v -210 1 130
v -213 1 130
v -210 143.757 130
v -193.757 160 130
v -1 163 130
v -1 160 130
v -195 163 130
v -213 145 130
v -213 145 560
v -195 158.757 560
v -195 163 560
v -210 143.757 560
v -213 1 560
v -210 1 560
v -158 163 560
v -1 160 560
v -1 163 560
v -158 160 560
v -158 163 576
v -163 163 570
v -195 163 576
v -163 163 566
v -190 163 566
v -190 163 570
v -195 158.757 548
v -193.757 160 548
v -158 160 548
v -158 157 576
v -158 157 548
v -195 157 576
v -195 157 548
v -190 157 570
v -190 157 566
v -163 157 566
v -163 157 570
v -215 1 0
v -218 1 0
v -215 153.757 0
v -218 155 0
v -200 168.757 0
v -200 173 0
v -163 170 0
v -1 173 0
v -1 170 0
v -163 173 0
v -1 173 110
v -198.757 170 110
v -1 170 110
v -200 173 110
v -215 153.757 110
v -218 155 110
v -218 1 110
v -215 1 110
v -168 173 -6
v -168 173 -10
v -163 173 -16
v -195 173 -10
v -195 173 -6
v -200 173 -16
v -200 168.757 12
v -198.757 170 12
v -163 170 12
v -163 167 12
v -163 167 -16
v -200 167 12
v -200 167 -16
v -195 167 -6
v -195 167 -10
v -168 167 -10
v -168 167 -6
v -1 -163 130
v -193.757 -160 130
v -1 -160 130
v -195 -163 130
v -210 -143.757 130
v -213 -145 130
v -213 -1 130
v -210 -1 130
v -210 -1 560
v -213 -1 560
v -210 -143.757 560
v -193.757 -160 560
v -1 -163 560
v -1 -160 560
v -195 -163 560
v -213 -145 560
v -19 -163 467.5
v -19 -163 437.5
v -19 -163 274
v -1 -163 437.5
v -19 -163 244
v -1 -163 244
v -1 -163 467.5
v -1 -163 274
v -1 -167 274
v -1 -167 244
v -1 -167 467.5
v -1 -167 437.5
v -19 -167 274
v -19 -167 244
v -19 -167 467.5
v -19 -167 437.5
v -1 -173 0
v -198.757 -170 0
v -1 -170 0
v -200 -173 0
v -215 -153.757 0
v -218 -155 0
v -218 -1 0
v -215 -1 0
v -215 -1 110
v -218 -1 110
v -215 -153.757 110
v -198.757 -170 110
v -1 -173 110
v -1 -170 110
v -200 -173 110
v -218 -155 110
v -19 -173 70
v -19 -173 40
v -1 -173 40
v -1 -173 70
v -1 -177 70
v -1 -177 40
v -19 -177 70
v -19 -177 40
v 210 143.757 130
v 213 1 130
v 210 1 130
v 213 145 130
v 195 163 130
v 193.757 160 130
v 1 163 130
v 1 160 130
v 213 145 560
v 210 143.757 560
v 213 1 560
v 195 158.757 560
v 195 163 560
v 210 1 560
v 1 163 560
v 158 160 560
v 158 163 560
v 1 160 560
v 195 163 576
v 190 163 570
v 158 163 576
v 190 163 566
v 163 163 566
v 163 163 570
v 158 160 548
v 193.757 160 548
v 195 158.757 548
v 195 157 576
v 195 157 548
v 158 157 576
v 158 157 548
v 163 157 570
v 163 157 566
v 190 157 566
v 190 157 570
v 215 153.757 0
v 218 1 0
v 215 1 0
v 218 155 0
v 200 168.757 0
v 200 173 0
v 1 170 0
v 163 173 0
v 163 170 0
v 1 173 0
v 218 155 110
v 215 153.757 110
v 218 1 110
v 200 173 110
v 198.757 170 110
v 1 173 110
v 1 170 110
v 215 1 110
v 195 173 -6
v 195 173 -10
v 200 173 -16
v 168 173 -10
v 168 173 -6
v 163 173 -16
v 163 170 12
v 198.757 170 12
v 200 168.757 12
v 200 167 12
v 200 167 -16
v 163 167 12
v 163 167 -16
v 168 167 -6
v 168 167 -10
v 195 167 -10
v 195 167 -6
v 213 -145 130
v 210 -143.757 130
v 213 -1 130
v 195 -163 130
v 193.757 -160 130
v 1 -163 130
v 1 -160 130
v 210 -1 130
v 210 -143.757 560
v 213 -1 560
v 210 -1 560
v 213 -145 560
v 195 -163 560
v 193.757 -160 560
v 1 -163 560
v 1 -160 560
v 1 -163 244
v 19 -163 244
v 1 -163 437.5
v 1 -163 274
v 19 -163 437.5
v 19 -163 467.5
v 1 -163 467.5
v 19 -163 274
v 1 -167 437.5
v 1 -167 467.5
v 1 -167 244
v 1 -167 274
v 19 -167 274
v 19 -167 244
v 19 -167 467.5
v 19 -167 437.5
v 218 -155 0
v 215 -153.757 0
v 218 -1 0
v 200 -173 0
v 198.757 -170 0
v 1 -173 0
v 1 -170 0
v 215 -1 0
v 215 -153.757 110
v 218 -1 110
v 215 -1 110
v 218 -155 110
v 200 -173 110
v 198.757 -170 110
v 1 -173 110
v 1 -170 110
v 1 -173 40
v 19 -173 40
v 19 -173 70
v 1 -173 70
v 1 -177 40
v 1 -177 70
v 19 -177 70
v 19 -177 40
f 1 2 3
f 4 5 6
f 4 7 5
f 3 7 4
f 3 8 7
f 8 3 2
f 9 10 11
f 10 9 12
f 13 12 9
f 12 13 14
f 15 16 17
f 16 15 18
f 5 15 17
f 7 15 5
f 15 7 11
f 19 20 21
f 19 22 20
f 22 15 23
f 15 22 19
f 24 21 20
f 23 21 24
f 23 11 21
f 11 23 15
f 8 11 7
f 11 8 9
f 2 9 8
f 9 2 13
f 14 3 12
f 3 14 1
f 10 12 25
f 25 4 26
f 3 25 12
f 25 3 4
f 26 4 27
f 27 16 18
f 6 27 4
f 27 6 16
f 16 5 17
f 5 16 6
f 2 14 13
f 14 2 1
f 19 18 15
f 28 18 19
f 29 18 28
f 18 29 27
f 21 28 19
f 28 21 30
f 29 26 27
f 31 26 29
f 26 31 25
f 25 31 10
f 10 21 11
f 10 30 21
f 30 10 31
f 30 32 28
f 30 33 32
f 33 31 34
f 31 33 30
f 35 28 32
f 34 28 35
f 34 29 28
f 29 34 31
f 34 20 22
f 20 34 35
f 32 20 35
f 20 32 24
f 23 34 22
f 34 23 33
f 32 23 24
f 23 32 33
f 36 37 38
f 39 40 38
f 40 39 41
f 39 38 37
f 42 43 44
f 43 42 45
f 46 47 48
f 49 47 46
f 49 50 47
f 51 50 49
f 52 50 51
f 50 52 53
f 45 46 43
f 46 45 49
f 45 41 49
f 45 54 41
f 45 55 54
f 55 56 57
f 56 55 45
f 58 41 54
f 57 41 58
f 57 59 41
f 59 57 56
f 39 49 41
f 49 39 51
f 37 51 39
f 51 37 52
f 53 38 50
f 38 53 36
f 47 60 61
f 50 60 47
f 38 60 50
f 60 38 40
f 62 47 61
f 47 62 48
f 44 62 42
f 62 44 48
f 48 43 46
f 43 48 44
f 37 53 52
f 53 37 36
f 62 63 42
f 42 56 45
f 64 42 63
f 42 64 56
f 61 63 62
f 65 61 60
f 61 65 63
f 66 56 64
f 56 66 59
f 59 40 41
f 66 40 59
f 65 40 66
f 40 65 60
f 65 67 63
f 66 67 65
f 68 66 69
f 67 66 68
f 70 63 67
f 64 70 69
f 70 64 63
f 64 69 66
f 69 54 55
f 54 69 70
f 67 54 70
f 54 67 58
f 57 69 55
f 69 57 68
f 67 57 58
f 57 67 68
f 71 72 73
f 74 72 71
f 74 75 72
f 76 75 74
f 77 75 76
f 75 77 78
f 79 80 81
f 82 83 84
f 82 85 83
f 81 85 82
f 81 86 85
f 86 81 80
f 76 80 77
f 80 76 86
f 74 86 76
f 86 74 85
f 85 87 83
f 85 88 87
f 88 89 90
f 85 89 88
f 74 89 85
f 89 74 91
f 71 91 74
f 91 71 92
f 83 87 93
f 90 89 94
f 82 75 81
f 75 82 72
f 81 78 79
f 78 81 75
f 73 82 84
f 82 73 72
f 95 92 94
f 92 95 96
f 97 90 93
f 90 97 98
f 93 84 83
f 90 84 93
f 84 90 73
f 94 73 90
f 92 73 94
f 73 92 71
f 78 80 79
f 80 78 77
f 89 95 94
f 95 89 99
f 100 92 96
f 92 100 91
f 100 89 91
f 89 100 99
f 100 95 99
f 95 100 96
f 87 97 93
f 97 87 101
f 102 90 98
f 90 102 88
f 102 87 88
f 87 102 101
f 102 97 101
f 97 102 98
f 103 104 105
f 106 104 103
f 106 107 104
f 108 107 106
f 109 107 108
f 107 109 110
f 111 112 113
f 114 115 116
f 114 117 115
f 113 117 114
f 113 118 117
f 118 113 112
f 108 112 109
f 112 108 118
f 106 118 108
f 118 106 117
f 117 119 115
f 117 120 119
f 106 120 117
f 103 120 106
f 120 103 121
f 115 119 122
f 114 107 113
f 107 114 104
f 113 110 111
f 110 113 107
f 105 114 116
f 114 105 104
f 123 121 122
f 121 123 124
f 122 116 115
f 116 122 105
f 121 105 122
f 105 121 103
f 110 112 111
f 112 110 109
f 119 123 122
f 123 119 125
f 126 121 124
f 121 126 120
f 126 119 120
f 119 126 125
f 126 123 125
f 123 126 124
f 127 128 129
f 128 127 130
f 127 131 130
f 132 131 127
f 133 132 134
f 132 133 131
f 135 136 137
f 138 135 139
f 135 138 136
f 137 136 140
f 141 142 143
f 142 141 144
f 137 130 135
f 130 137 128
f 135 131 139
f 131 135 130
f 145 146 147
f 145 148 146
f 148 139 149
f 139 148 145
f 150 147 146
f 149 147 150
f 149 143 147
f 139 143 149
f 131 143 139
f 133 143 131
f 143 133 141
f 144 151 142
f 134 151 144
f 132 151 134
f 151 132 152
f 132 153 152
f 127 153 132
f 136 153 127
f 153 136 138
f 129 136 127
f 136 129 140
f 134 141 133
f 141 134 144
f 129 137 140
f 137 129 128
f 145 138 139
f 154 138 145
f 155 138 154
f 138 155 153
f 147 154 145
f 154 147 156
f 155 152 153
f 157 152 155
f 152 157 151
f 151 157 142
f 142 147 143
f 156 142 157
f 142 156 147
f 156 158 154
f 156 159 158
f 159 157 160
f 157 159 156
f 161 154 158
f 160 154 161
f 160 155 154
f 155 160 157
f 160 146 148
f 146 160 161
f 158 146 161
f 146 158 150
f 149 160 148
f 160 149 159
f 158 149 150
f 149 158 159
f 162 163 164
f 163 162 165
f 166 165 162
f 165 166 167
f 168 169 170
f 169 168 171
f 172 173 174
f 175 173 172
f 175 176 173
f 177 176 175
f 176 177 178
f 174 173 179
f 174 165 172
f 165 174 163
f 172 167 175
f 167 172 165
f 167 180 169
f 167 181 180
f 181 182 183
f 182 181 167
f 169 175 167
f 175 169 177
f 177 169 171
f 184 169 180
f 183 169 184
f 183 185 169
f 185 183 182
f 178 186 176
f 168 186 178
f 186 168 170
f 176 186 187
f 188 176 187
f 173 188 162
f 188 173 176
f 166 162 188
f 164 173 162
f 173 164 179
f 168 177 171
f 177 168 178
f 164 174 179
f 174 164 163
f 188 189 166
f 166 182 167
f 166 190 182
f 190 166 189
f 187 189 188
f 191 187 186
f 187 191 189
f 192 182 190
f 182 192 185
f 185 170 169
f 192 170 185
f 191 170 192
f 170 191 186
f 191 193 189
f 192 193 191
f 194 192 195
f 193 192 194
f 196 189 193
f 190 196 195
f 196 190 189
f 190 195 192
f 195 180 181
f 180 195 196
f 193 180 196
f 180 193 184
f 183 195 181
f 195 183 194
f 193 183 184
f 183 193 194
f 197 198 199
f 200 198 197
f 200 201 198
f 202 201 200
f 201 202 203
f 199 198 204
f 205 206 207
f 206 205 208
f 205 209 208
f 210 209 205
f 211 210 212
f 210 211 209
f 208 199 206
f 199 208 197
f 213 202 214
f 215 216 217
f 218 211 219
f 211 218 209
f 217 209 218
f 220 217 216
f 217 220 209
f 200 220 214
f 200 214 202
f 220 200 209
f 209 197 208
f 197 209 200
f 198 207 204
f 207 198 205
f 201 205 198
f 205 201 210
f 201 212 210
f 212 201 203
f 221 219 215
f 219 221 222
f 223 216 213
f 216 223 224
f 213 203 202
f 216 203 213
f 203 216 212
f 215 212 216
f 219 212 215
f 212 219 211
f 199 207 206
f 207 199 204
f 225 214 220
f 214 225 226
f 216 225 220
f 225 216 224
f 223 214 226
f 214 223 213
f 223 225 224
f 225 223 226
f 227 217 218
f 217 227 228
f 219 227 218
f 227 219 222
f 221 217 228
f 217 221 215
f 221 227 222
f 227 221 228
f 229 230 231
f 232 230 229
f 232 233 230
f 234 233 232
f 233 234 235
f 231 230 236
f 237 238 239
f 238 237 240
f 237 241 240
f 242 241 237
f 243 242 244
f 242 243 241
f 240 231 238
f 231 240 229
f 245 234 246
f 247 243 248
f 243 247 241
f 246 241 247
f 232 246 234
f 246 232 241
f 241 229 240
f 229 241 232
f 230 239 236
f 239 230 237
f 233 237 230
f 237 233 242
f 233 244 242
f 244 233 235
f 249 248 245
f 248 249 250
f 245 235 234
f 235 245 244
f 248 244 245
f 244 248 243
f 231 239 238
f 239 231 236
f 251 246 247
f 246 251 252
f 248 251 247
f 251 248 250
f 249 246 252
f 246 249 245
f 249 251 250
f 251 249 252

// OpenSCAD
// file: Parameters.scad
// SYNTHETIC DESIGN EXAMPLE ONLY. Generate project dimensions with suit_clamshell.py.
// limbs_mm rows: upperarm_l/r, forearm_l/r, thigh_l/r, shin_l/r; [diameter, length].
// boots_mm rows: l, r; [width, length]. torso_mm/helmet_mm: [width, depth, height]. hip_mm: [width, depth].
wall_mm = 3;
seam_gap_mm = 2;
hinge_offset_mm = 8;
opening_deg = 110;
elbow_gap_mm = 40;
elbow_relief_mm = 50;
knee_gap_mm = 40;
knee_relief_mm = 95;
ankle_gap_mm = 25;
boot_height_mm = 110;
belt_height_mm = 110;
belt_gap_mm = 20;
helmet_opening_deg = 100;
helmet_split_fraction = 0.12;
strap_width_mm = 25;
latch_pad_mm = [30, 18, 4];
latch_hole_d_mm = 0;
latch_holes_mm = [];
keeper_holes_mm = [];
limbs_mm = [[148, 270], [148, 270], [135, 230], [135, 230], [221, 380], [221, 380], [164, 365], [164, 365]];
boots_mm = [[140, 320], [140, 320]];
torso_mm = [426, 326, 430];
hip_mm = [436, 346];
shoulder_span_mm = 556;
entry_slide_mm = 50;
helmet_mm = [206, 246, 263];
// main file
// Torso module: two sliding rear wings, two front doors, belt band and the hang points
// for arm and leg modules. Concept envelopes only. No carrier, real hinge, slide rail,
// purchased latch or load approval; the fixed spine carrier is not modelled.
include <Parameters.scad>

side = "l";
open_fraction = 0;
piece = "assembly";
$fn = 48;

assert(side == "l" || side == "r", "side must be l or r");
assert(piece == "assembly" || piece == "rear" || piece == "door" || piece == "belt_rear" || piece == "belt_door",
       "piece must be assembly, rear, door, belt_rear or belt_door");
assert(is_num(open_fraction) && open_fraction >= 0 && open_fraction <= 1, "open_fraction must be 0..1");
assert(is_num(wall_mm) && wall_mm > 0, "positive wall required");
assert(is_num(seam_gap_mm) && seam_gap_mm > 0, "positive seam gap required");
assert(is_num(opening_deg) && opening_deg > 0 && opening_deg <= 150, "opening angle must be 0..150 degrees");
assert(len(torso_mm) == 3 && len(hip_mm) == 2, "torso needs [width, depth, height], hip [width, depth]");
assert(is_num(entry_slide_mm) && entry_slide_mm >= 0, "nonnegative entry slide required");
assert(is_num(belt_height_mm) && belt_height_mm > 0 && is_num(belt_gap_mm) && belt_gap_mm > 0, "invalid belt band");
assert(is_num(strap_width_mm) && strap_width_mm > 0, "positive strap width required");
assert(len(latch_pad_mm) == 3, "latch pad needs [length, width, thickness]");
assert(is_num(latch_hole_d_mm) && latch_hole_d_mm >= 0, "nonnegative latch hole diameter required");
// Hole lists: [across, along] per hole. across = distance from the seam centre line on the
// land, along = offset along the seam from the middle of the land. Empty lists leave it blank.
function holes_fit(holes) = len([for (h = holes) if (!(len(h) == 2 && latch_hole_d_mm > 0 &&
    h[0] - latch_hole_d_mm / 2 >= seam_gap_mm / 2 && h[0] + latch_hole_d_mm / 2 <= seam_gap_mm / 2 + latch_pad_mm[1] &&
    abs(h[1]) + latch_hole_d_mm / 2 <= latch_pad_mm[0] / 2)) 1]) == 0;
assert(is_list(latch_holes_mm) && holes_fit(latch_holes_mm), "latch holes need a diameter and must lie on the land");
assert(is_list(keeper_holes_mm) && holes_fit(keeper_holes_mm), "keeper holes need a diameter and must lie on the land");

chamfer = 18;
lug_margin = 6;
slot_height = 4;
lug_width = strap_width_mm + 2 * lug_margin;
lug_height = 2 * lug_margin + slot_height;
torso_z = belt_height_mm + belt_gap_mm;
assert(torso_mm[0] > 4 * chamfer && torso_mm[1] > 4 * chamfer && torso_mm[2] > 3 * latch_pad_mm[0], "torso too small");
assert(hip_mm[0] > 4 * chamfer && hip_mm[1] > 4 * chamfer, "hip too small");

// The motion follows the entry concept: wings slide apart first, then the doors swing out.
slide = entry_slide_mm * min(1, open_fraction * 4);
swing = opening_deg * max(0, (open_fraction - 0.25) / 0.75);

// Model axes: X to the wearer's right (side l is negative X), negative Y front, Z up.
module outline(w, d) {
    polygon([[-w / 2 + chamfer, -d / 2], [w / 2 - chamfer, -d / 2], [w / 2, -d / 2 + chamfer],
             [w / 2, d / 2 - chamfer], [w / 2 - chamfer, d / 2], [-w / 2 + chamfer, d / 2],
             [-w / 2, d / 2 - chamfer], [-w / 2, -d / 2 + chamfer]]);
}

module quadrant(w, d, h, sign, front) {
    intersection() {
        linear_extrude(height = h) difference() {
            outline(w, d);
            offset(delta = -wall_mm) outline(w, d);
        }
        translate([sign > 0 ? seam_gap_mm / 2 : -w, front ? -d : seam_gap_mm / 2, -1])
            cube([w - seam_gap_mm / 2, d - seam_gap_mm / 2, h + 2]);
    }
}

// Flat land for a purchased latch on the front of a door or belt half, next to the centre seam.
// The right half carries the latch body (latch_holes_mm), the left half the keeper.
module front_pad(d, sign, z) {
    x0 = sign > 0 ? seam_gap_mm / 2 : -seam_gap_mm / 2 - latch_pad_mm[1];
    difference() {
        translate([x0, -d / 2 - latch_pad_mm[2], z - latch_pad_mm[0] / 2])
            cube([latch_pad_mm[1], latch_pad_mm[2] + 1, latch_pad_mm[0]]);
        for (hole = sign > 0 ? latch_holes_mm : keeper_holes_mm)
                translate([sign * hole[0], -d / 2, z + hole[1]])
                    rotate([90, 0, 0]) cylinder(h = 2 * (latch_pad_mm[2] + wall_mm + 5), d = latch_hole_d_mm, center = true, $fn = 24);
    }
}

// Webbing tab; up = true stands above z, otherwise hangs below it.
module hang_lug(x, y, z, up) {
    translate([x - lug_width / 2, y - wall_mm - 3, up ? z - 12 : z - lug_height]) difference() {
        cube([lug_width, wall_mm + 3, 12 + lug_height]);
        translate([lug_margin - 1, -1, up ? 12 + lug_margin : lug_margin])
            cube([strap_width_mm + 2, wall_mm + 5, slot_height]);
    }
}

// Rear wing: carries the hang point of one arm module on top.
module rear_wing(sign) {
    color([0.19, 0.28, 0.20]) translate([0, 0, torso_z]) {
        quadrant(torso_mm[0], torso_mm[1], torso_mm[2], sign, false);
        hang_lug(sign * (torso_mm[0] / 2 - chamfer - lug_width / 2), torso_mm[1] / 2, torso_mm[2], true);
    }
}

// Front door with two latch lands at the centre seam.
module door(sign) {
    color([0.45, 0.56, 0.28]) translate([0, 0, torso_z]) {
        quadrant(torso_mm[0], torso_mm[1], torso_mm[2], sign, true);
        for (z = [torso_mm[2] * 0.3, torso_mm[2] * 0.75]) front_pad(torso_mm[1], sign, z);
    }
}

// Rear belt half: carries the hang point of one leg module below.
module belt_rear(sign) {
    color([0.19, 0.28, 0.20]) {
        quadrant(hip_mm[0], hip_mm[1], belt_height_mm, sign, false);
        hang_lug(sign * (hip_mm[0] / 2 - chamfer - lug_width / 2), hip_mm[1] / 2, 0, false);
    }
}

module belt_door(sign) {
    color([0.45, 0.56, 0.28]) {
        quadrant(hip_mm[0], hip_mm[1], belt_height_mm, sign, true);
        front_pad(hip_mm[1], sign, belt_height_mm / 2);
    }
}

module swung(sign, w) {
    translate([sign * (w / 2 + slide), 0, 0]) rotate([0, 0, sign * swing]) translate([-sign * w / 2, 0, 0]) children();
}

if (piece == "assembly") {
    for (sign = [-1, 1]) {
        translate([sign * slide, 0, 0]) { rear_wing(sign); belt_rear(sign); }
        swung(sign, torso_mm[0]) door(sign);
        swung(sign, hip_mm[0]) belt_door(sign);
        // Preview-only: virtual door pivot and the textile-mounted shoulder cap.
        if ($preview) {
            %translate([sign * (torso_mm[0] / 2 + slide), 0, 0]) cylinder(h = torso_z + torso_mm[2], r = 1.5);
            %translate([sign * (shoulder_span_mm / 2 + slide), 0, torso_z + torso_mm[2] - 40])
                cube([125, torso_mm[1] * 0.65, 125], center = true);
        }
    }
} else {
    sign = side == "l" ? -1 : 1;
    if (piece == "rear") rear_wing(sign);
    if (piece == "door") door(sign);
    if (piece == "belt_rear") belt_rear(sign);
    if (piece == "belt_door") belt_door(sign);
}
